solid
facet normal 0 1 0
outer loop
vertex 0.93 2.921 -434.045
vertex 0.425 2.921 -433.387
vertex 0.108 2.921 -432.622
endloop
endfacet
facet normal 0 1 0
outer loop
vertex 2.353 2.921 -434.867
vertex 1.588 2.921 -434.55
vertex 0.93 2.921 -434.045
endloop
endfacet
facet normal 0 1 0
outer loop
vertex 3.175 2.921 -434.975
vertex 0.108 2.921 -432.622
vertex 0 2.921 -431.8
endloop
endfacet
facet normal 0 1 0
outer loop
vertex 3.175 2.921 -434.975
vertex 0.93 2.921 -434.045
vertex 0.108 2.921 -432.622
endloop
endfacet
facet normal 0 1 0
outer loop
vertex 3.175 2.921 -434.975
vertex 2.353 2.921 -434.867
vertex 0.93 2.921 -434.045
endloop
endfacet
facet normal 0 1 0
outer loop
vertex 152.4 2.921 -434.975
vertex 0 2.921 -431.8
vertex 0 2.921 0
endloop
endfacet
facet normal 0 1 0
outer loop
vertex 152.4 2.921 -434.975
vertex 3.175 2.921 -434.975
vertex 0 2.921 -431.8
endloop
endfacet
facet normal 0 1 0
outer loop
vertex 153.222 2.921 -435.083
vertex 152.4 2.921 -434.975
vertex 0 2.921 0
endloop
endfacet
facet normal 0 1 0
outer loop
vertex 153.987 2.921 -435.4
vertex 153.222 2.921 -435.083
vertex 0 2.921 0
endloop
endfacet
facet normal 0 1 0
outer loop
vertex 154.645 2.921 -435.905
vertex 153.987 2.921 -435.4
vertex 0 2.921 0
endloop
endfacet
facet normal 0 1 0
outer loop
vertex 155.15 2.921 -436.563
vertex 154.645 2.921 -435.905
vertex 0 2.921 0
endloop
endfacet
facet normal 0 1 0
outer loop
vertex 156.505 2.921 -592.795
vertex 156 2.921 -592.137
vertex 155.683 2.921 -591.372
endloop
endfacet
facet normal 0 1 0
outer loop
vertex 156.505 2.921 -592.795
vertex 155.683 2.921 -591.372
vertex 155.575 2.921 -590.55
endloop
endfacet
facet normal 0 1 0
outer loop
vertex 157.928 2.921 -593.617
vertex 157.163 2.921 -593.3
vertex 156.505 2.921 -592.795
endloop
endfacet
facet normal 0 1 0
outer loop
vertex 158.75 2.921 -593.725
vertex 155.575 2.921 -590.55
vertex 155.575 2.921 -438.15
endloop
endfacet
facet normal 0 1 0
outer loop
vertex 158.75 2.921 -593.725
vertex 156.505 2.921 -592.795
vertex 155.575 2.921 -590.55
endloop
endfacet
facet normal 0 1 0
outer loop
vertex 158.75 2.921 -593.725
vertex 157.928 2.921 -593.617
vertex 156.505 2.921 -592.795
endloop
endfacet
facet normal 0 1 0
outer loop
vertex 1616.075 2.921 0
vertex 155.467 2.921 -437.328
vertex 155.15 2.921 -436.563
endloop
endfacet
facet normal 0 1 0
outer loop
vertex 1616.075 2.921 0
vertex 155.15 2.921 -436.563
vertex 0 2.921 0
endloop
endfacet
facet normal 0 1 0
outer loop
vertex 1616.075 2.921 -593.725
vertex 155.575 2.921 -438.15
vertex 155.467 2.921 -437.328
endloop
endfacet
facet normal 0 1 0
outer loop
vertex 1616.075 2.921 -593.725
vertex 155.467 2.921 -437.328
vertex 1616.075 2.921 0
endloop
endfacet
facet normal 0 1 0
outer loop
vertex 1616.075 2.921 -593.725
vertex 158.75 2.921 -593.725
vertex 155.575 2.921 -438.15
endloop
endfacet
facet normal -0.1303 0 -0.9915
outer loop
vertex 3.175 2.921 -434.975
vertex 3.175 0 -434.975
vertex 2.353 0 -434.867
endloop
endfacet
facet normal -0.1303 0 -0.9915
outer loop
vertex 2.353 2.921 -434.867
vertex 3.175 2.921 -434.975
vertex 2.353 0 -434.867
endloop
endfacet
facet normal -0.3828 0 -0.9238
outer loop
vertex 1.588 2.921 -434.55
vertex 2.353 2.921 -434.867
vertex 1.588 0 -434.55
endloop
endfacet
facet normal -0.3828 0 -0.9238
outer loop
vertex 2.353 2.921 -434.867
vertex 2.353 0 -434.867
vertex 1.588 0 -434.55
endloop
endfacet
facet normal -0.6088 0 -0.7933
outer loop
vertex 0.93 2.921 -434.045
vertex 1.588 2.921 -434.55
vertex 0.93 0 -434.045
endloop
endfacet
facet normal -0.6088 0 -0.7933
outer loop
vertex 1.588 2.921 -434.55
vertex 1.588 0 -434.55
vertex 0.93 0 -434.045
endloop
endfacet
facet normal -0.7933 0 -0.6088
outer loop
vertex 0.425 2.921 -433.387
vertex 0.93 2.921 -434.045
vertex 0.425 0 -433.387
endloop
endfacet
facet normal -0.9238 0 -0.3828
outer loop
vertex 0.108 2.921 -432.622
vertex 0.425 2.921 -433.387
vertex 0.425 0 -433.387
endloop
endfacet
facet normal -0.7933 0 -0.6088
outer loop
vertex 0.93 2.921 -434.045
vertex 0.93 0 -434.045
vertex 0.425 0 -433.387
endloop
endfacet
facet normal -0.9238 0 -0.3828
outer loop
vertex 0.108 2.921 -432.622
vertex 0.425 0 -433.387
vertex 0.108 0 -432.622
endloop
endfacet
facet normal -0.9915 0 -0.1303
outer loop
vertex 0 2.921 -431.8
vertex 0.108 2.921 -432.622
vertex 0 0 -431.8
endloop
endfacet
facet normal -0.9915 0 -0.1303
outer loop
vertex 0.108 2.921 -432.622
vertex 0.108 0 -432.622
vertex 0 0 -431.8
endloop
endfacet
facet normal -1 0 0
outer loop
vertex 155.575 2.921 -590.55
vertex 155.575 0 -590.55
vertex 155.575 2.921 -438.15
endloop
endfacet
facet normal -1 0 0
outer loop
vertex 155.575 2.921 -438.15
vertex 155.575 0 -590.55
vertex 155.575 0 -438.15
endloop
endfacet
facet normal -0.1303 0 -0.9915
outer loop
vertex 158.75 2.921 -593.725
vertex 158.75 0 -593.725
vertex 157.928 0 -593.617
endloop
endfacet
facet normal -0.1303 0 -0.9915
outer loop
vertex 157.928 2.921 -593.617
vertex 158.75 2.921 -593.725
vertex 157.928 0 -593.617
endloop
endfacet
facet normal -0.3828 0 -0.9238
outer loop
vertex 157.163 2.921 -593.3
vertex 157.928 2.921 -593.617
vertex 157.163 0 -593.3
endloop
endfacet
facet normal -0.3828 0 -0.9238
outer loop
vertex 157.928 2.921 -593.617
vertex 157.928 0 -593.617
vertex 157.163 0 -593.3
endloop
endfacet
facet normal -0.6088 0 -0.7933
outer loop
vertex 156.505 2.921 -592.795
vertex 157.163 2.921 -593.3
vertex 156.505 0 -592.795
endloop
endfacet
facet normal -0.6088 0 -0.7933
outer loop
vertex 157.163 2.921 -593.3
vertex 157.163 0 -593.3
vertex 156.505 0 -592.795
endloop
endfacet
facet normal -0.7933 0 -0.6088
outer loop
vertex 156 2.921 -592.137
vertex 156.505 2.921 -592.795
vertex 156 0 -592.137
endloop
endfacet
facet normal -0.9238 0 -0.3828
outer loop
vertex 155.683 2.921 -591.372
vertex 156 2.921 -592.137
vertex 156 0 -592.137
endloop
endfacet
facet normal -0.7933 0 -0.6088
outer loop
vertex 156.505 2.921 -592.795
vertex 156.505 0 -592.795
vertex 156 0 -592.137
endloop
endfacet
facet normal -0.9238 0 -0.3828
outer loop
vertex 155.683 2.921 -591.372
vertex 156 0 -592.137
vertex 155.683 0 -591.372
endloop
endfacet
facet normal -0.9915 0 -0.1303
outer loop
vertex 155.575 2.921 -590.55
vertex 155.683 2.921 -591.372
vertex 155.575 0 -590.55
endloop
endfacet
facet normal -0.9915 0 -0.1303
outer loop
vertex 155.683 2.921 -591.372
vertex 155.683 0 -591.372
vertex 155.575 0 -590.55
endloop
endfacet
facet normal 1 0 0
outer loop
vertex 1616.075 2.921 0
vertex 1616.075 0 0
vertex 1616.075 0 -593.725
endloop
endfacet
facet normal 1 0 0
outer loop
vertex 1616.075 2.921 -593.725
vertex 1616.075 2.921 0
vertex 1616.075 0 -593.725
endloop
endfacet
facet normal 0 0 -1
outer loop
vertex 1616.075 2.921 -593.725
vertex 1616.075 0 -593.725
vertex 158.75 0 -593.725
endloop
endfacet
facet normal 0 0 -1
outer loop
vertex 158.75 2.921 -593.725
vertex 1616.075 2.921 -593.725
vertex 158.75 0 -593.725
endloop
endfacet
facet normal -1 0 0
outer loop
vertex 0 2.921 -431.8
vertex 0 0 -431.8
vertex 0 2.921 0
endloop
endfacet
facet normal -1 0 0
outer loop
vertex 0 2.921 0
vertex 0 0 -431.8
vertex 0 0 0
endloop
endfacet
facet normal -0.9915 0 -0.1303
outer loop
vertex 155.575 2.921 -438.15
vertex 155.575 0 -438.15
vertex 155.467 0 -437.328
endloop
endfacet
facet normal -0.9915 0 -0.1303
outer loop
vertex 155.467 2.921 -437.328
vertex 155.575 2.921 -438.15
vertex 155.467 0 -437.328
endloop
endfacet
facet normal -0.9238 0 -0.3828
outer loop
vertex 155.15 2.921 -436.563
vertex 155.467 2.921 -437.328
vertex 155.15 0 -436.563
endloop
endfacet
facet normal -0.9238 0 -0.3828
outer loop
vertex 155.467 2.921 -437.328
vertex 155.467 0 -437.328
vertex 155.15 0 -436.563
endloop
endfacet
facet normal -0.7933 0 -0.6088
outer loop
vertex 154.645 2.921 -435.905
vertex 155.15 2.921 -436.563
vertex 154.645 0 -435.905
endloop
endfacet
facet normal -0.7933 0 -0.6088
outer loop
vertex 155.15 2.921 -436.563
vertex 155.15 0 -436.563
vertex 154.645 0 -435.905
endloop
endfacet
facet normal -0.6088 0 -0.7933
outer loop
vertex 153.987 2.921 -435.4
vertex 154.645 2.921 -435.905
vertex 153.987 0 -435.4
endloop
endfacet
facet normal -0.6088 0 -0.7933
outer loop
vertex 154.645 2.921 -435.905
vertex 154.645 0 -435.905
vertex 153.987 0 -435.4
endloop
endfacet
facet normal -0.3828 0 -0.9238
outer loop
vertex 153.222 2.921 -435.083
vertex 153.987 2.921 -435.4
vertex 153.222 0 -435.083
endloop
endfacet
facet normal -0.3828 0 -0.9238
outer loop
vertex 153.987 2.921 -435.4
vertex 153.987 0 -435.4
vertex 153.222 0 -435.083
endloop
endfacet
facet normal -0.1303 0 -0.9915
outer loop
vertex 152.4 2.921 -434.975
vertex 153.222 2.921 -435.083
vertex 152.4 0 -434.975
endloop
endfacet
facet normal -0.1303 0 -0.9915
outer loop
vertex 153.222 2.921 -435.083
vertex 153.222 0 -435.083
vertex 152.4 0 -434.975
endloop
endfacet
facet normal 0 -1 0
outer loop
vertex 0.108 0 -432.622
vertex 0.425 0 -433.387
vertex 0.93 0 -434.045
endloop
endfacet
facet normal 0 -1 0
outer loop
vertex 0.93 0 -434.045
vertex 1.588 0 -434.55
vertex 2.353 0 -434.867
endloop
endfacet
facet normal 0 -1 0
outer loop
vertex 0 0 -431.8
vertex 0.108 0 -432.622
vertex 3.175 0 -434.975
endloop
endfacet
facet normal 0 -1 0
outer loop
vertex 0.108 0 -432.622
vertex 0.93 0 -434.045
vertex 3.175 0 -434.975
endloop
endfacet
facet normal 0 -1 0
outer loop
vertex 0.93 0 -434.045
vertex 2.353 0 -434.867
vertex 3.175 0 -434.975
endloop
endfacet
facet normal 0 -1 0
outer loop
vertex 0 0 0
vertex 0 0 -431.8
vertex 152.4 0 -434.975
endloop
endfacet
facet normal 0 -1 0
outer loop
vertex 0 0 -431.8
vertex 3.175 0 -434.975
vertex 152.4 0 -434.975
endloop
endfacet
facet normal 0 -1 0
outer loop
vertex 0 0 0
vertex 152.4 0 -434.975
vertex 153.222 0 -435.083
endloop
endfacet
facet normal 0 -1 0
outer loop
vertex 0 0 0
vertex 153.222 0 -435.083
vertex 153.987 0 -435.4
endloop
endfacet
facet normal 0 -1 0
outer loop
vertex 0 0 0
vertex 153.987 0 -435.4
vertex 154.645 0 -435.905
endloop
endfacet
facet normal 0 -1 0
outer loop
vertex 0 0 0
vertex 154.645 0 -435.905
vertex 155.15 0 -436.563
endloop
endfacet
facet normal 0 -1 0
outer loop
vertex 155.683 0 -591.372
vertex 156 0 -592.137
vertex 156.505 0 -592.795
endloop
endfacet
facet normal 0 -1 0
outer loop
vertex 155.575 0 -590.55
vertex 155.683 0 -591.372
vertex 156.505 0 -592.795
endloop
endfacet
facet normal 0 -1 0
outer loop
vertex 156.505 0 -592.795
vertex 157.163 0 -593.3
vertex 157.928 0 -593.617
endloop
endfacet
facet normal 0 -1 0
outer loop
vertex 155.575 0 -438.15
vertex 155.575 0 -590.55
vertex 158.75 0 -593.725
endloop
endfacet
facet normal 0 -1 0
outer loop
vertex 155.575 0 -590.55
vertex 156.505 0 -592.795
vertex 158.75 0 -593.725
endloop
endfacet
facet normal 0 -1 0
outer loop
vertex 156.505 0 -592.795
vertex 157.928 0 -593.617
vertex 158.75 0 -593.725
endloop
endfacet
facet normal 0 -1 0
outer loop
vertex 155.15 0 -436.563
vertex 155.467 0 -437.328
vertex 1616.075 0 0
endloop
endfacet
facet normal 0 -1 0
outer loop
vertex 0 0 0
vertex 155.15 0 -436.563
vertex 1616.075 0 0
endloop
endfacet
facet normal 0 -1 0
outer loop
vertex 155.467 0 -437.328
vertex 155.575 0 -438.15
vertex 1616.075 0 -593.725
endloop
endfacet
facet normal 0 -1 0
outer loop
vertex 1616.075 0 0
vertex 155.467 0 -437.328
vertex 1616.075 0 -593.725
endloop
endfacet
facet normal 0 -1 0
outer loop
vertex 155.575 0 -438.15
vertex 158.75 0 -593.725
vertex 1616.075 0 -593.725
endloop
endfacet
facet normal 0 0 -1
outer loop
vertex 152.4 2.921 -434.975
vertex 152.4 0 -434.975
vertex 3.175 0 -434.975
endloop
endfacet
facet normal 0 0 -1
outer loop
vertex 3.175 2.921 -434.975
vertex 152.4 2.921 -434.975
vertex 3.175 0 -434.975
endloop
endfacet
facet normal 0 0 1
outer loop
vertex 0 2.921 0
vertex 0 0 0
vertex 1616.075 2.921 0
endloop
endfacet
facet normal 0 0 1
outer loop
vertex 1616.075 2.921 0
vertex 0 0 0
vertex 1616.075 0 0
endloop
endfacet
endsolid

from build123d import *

# Parameters (mm, degrees)
BOSS_EXTRUDE1_DEPTH = 2.921


with BuildPart() as part:
    # Sketch1 → Boss-Extrude1 (new body)
    with BuildSketch(Plane(origin=(0, 0, 0), x_dir=(1, 0, 0), z_dir=(0, 1, 0))):
        with BuildLine():
            Line((0, 0), (1616.075, 0))
            Line((1616.075, 0), (1616.075, 593.725))
            Line((1616.075, 593.725), (158.75, 593.725))
            ThreePointArc((158.75, 593.725), (156.50493597, 592.79506403), (155.575, 590.55))
            Line((155.575, 590.55), (155.575, 438.15))
            ThreePointArc((155.575, 438.15), (154.64506403, 435.90493597), (152.4, 434.975))
            Line((152.4, 434.975), (3.175, 434.975))
            ThreePointArc((3.175, 434.975), (0.92993597, 434.04506403), (0, 431.8))
            Line((0, 431.8), (0, 0))
        make_face()
    extrude(amount=BOSS_EXTRUDE1_DEPTH)


solid = part.part
